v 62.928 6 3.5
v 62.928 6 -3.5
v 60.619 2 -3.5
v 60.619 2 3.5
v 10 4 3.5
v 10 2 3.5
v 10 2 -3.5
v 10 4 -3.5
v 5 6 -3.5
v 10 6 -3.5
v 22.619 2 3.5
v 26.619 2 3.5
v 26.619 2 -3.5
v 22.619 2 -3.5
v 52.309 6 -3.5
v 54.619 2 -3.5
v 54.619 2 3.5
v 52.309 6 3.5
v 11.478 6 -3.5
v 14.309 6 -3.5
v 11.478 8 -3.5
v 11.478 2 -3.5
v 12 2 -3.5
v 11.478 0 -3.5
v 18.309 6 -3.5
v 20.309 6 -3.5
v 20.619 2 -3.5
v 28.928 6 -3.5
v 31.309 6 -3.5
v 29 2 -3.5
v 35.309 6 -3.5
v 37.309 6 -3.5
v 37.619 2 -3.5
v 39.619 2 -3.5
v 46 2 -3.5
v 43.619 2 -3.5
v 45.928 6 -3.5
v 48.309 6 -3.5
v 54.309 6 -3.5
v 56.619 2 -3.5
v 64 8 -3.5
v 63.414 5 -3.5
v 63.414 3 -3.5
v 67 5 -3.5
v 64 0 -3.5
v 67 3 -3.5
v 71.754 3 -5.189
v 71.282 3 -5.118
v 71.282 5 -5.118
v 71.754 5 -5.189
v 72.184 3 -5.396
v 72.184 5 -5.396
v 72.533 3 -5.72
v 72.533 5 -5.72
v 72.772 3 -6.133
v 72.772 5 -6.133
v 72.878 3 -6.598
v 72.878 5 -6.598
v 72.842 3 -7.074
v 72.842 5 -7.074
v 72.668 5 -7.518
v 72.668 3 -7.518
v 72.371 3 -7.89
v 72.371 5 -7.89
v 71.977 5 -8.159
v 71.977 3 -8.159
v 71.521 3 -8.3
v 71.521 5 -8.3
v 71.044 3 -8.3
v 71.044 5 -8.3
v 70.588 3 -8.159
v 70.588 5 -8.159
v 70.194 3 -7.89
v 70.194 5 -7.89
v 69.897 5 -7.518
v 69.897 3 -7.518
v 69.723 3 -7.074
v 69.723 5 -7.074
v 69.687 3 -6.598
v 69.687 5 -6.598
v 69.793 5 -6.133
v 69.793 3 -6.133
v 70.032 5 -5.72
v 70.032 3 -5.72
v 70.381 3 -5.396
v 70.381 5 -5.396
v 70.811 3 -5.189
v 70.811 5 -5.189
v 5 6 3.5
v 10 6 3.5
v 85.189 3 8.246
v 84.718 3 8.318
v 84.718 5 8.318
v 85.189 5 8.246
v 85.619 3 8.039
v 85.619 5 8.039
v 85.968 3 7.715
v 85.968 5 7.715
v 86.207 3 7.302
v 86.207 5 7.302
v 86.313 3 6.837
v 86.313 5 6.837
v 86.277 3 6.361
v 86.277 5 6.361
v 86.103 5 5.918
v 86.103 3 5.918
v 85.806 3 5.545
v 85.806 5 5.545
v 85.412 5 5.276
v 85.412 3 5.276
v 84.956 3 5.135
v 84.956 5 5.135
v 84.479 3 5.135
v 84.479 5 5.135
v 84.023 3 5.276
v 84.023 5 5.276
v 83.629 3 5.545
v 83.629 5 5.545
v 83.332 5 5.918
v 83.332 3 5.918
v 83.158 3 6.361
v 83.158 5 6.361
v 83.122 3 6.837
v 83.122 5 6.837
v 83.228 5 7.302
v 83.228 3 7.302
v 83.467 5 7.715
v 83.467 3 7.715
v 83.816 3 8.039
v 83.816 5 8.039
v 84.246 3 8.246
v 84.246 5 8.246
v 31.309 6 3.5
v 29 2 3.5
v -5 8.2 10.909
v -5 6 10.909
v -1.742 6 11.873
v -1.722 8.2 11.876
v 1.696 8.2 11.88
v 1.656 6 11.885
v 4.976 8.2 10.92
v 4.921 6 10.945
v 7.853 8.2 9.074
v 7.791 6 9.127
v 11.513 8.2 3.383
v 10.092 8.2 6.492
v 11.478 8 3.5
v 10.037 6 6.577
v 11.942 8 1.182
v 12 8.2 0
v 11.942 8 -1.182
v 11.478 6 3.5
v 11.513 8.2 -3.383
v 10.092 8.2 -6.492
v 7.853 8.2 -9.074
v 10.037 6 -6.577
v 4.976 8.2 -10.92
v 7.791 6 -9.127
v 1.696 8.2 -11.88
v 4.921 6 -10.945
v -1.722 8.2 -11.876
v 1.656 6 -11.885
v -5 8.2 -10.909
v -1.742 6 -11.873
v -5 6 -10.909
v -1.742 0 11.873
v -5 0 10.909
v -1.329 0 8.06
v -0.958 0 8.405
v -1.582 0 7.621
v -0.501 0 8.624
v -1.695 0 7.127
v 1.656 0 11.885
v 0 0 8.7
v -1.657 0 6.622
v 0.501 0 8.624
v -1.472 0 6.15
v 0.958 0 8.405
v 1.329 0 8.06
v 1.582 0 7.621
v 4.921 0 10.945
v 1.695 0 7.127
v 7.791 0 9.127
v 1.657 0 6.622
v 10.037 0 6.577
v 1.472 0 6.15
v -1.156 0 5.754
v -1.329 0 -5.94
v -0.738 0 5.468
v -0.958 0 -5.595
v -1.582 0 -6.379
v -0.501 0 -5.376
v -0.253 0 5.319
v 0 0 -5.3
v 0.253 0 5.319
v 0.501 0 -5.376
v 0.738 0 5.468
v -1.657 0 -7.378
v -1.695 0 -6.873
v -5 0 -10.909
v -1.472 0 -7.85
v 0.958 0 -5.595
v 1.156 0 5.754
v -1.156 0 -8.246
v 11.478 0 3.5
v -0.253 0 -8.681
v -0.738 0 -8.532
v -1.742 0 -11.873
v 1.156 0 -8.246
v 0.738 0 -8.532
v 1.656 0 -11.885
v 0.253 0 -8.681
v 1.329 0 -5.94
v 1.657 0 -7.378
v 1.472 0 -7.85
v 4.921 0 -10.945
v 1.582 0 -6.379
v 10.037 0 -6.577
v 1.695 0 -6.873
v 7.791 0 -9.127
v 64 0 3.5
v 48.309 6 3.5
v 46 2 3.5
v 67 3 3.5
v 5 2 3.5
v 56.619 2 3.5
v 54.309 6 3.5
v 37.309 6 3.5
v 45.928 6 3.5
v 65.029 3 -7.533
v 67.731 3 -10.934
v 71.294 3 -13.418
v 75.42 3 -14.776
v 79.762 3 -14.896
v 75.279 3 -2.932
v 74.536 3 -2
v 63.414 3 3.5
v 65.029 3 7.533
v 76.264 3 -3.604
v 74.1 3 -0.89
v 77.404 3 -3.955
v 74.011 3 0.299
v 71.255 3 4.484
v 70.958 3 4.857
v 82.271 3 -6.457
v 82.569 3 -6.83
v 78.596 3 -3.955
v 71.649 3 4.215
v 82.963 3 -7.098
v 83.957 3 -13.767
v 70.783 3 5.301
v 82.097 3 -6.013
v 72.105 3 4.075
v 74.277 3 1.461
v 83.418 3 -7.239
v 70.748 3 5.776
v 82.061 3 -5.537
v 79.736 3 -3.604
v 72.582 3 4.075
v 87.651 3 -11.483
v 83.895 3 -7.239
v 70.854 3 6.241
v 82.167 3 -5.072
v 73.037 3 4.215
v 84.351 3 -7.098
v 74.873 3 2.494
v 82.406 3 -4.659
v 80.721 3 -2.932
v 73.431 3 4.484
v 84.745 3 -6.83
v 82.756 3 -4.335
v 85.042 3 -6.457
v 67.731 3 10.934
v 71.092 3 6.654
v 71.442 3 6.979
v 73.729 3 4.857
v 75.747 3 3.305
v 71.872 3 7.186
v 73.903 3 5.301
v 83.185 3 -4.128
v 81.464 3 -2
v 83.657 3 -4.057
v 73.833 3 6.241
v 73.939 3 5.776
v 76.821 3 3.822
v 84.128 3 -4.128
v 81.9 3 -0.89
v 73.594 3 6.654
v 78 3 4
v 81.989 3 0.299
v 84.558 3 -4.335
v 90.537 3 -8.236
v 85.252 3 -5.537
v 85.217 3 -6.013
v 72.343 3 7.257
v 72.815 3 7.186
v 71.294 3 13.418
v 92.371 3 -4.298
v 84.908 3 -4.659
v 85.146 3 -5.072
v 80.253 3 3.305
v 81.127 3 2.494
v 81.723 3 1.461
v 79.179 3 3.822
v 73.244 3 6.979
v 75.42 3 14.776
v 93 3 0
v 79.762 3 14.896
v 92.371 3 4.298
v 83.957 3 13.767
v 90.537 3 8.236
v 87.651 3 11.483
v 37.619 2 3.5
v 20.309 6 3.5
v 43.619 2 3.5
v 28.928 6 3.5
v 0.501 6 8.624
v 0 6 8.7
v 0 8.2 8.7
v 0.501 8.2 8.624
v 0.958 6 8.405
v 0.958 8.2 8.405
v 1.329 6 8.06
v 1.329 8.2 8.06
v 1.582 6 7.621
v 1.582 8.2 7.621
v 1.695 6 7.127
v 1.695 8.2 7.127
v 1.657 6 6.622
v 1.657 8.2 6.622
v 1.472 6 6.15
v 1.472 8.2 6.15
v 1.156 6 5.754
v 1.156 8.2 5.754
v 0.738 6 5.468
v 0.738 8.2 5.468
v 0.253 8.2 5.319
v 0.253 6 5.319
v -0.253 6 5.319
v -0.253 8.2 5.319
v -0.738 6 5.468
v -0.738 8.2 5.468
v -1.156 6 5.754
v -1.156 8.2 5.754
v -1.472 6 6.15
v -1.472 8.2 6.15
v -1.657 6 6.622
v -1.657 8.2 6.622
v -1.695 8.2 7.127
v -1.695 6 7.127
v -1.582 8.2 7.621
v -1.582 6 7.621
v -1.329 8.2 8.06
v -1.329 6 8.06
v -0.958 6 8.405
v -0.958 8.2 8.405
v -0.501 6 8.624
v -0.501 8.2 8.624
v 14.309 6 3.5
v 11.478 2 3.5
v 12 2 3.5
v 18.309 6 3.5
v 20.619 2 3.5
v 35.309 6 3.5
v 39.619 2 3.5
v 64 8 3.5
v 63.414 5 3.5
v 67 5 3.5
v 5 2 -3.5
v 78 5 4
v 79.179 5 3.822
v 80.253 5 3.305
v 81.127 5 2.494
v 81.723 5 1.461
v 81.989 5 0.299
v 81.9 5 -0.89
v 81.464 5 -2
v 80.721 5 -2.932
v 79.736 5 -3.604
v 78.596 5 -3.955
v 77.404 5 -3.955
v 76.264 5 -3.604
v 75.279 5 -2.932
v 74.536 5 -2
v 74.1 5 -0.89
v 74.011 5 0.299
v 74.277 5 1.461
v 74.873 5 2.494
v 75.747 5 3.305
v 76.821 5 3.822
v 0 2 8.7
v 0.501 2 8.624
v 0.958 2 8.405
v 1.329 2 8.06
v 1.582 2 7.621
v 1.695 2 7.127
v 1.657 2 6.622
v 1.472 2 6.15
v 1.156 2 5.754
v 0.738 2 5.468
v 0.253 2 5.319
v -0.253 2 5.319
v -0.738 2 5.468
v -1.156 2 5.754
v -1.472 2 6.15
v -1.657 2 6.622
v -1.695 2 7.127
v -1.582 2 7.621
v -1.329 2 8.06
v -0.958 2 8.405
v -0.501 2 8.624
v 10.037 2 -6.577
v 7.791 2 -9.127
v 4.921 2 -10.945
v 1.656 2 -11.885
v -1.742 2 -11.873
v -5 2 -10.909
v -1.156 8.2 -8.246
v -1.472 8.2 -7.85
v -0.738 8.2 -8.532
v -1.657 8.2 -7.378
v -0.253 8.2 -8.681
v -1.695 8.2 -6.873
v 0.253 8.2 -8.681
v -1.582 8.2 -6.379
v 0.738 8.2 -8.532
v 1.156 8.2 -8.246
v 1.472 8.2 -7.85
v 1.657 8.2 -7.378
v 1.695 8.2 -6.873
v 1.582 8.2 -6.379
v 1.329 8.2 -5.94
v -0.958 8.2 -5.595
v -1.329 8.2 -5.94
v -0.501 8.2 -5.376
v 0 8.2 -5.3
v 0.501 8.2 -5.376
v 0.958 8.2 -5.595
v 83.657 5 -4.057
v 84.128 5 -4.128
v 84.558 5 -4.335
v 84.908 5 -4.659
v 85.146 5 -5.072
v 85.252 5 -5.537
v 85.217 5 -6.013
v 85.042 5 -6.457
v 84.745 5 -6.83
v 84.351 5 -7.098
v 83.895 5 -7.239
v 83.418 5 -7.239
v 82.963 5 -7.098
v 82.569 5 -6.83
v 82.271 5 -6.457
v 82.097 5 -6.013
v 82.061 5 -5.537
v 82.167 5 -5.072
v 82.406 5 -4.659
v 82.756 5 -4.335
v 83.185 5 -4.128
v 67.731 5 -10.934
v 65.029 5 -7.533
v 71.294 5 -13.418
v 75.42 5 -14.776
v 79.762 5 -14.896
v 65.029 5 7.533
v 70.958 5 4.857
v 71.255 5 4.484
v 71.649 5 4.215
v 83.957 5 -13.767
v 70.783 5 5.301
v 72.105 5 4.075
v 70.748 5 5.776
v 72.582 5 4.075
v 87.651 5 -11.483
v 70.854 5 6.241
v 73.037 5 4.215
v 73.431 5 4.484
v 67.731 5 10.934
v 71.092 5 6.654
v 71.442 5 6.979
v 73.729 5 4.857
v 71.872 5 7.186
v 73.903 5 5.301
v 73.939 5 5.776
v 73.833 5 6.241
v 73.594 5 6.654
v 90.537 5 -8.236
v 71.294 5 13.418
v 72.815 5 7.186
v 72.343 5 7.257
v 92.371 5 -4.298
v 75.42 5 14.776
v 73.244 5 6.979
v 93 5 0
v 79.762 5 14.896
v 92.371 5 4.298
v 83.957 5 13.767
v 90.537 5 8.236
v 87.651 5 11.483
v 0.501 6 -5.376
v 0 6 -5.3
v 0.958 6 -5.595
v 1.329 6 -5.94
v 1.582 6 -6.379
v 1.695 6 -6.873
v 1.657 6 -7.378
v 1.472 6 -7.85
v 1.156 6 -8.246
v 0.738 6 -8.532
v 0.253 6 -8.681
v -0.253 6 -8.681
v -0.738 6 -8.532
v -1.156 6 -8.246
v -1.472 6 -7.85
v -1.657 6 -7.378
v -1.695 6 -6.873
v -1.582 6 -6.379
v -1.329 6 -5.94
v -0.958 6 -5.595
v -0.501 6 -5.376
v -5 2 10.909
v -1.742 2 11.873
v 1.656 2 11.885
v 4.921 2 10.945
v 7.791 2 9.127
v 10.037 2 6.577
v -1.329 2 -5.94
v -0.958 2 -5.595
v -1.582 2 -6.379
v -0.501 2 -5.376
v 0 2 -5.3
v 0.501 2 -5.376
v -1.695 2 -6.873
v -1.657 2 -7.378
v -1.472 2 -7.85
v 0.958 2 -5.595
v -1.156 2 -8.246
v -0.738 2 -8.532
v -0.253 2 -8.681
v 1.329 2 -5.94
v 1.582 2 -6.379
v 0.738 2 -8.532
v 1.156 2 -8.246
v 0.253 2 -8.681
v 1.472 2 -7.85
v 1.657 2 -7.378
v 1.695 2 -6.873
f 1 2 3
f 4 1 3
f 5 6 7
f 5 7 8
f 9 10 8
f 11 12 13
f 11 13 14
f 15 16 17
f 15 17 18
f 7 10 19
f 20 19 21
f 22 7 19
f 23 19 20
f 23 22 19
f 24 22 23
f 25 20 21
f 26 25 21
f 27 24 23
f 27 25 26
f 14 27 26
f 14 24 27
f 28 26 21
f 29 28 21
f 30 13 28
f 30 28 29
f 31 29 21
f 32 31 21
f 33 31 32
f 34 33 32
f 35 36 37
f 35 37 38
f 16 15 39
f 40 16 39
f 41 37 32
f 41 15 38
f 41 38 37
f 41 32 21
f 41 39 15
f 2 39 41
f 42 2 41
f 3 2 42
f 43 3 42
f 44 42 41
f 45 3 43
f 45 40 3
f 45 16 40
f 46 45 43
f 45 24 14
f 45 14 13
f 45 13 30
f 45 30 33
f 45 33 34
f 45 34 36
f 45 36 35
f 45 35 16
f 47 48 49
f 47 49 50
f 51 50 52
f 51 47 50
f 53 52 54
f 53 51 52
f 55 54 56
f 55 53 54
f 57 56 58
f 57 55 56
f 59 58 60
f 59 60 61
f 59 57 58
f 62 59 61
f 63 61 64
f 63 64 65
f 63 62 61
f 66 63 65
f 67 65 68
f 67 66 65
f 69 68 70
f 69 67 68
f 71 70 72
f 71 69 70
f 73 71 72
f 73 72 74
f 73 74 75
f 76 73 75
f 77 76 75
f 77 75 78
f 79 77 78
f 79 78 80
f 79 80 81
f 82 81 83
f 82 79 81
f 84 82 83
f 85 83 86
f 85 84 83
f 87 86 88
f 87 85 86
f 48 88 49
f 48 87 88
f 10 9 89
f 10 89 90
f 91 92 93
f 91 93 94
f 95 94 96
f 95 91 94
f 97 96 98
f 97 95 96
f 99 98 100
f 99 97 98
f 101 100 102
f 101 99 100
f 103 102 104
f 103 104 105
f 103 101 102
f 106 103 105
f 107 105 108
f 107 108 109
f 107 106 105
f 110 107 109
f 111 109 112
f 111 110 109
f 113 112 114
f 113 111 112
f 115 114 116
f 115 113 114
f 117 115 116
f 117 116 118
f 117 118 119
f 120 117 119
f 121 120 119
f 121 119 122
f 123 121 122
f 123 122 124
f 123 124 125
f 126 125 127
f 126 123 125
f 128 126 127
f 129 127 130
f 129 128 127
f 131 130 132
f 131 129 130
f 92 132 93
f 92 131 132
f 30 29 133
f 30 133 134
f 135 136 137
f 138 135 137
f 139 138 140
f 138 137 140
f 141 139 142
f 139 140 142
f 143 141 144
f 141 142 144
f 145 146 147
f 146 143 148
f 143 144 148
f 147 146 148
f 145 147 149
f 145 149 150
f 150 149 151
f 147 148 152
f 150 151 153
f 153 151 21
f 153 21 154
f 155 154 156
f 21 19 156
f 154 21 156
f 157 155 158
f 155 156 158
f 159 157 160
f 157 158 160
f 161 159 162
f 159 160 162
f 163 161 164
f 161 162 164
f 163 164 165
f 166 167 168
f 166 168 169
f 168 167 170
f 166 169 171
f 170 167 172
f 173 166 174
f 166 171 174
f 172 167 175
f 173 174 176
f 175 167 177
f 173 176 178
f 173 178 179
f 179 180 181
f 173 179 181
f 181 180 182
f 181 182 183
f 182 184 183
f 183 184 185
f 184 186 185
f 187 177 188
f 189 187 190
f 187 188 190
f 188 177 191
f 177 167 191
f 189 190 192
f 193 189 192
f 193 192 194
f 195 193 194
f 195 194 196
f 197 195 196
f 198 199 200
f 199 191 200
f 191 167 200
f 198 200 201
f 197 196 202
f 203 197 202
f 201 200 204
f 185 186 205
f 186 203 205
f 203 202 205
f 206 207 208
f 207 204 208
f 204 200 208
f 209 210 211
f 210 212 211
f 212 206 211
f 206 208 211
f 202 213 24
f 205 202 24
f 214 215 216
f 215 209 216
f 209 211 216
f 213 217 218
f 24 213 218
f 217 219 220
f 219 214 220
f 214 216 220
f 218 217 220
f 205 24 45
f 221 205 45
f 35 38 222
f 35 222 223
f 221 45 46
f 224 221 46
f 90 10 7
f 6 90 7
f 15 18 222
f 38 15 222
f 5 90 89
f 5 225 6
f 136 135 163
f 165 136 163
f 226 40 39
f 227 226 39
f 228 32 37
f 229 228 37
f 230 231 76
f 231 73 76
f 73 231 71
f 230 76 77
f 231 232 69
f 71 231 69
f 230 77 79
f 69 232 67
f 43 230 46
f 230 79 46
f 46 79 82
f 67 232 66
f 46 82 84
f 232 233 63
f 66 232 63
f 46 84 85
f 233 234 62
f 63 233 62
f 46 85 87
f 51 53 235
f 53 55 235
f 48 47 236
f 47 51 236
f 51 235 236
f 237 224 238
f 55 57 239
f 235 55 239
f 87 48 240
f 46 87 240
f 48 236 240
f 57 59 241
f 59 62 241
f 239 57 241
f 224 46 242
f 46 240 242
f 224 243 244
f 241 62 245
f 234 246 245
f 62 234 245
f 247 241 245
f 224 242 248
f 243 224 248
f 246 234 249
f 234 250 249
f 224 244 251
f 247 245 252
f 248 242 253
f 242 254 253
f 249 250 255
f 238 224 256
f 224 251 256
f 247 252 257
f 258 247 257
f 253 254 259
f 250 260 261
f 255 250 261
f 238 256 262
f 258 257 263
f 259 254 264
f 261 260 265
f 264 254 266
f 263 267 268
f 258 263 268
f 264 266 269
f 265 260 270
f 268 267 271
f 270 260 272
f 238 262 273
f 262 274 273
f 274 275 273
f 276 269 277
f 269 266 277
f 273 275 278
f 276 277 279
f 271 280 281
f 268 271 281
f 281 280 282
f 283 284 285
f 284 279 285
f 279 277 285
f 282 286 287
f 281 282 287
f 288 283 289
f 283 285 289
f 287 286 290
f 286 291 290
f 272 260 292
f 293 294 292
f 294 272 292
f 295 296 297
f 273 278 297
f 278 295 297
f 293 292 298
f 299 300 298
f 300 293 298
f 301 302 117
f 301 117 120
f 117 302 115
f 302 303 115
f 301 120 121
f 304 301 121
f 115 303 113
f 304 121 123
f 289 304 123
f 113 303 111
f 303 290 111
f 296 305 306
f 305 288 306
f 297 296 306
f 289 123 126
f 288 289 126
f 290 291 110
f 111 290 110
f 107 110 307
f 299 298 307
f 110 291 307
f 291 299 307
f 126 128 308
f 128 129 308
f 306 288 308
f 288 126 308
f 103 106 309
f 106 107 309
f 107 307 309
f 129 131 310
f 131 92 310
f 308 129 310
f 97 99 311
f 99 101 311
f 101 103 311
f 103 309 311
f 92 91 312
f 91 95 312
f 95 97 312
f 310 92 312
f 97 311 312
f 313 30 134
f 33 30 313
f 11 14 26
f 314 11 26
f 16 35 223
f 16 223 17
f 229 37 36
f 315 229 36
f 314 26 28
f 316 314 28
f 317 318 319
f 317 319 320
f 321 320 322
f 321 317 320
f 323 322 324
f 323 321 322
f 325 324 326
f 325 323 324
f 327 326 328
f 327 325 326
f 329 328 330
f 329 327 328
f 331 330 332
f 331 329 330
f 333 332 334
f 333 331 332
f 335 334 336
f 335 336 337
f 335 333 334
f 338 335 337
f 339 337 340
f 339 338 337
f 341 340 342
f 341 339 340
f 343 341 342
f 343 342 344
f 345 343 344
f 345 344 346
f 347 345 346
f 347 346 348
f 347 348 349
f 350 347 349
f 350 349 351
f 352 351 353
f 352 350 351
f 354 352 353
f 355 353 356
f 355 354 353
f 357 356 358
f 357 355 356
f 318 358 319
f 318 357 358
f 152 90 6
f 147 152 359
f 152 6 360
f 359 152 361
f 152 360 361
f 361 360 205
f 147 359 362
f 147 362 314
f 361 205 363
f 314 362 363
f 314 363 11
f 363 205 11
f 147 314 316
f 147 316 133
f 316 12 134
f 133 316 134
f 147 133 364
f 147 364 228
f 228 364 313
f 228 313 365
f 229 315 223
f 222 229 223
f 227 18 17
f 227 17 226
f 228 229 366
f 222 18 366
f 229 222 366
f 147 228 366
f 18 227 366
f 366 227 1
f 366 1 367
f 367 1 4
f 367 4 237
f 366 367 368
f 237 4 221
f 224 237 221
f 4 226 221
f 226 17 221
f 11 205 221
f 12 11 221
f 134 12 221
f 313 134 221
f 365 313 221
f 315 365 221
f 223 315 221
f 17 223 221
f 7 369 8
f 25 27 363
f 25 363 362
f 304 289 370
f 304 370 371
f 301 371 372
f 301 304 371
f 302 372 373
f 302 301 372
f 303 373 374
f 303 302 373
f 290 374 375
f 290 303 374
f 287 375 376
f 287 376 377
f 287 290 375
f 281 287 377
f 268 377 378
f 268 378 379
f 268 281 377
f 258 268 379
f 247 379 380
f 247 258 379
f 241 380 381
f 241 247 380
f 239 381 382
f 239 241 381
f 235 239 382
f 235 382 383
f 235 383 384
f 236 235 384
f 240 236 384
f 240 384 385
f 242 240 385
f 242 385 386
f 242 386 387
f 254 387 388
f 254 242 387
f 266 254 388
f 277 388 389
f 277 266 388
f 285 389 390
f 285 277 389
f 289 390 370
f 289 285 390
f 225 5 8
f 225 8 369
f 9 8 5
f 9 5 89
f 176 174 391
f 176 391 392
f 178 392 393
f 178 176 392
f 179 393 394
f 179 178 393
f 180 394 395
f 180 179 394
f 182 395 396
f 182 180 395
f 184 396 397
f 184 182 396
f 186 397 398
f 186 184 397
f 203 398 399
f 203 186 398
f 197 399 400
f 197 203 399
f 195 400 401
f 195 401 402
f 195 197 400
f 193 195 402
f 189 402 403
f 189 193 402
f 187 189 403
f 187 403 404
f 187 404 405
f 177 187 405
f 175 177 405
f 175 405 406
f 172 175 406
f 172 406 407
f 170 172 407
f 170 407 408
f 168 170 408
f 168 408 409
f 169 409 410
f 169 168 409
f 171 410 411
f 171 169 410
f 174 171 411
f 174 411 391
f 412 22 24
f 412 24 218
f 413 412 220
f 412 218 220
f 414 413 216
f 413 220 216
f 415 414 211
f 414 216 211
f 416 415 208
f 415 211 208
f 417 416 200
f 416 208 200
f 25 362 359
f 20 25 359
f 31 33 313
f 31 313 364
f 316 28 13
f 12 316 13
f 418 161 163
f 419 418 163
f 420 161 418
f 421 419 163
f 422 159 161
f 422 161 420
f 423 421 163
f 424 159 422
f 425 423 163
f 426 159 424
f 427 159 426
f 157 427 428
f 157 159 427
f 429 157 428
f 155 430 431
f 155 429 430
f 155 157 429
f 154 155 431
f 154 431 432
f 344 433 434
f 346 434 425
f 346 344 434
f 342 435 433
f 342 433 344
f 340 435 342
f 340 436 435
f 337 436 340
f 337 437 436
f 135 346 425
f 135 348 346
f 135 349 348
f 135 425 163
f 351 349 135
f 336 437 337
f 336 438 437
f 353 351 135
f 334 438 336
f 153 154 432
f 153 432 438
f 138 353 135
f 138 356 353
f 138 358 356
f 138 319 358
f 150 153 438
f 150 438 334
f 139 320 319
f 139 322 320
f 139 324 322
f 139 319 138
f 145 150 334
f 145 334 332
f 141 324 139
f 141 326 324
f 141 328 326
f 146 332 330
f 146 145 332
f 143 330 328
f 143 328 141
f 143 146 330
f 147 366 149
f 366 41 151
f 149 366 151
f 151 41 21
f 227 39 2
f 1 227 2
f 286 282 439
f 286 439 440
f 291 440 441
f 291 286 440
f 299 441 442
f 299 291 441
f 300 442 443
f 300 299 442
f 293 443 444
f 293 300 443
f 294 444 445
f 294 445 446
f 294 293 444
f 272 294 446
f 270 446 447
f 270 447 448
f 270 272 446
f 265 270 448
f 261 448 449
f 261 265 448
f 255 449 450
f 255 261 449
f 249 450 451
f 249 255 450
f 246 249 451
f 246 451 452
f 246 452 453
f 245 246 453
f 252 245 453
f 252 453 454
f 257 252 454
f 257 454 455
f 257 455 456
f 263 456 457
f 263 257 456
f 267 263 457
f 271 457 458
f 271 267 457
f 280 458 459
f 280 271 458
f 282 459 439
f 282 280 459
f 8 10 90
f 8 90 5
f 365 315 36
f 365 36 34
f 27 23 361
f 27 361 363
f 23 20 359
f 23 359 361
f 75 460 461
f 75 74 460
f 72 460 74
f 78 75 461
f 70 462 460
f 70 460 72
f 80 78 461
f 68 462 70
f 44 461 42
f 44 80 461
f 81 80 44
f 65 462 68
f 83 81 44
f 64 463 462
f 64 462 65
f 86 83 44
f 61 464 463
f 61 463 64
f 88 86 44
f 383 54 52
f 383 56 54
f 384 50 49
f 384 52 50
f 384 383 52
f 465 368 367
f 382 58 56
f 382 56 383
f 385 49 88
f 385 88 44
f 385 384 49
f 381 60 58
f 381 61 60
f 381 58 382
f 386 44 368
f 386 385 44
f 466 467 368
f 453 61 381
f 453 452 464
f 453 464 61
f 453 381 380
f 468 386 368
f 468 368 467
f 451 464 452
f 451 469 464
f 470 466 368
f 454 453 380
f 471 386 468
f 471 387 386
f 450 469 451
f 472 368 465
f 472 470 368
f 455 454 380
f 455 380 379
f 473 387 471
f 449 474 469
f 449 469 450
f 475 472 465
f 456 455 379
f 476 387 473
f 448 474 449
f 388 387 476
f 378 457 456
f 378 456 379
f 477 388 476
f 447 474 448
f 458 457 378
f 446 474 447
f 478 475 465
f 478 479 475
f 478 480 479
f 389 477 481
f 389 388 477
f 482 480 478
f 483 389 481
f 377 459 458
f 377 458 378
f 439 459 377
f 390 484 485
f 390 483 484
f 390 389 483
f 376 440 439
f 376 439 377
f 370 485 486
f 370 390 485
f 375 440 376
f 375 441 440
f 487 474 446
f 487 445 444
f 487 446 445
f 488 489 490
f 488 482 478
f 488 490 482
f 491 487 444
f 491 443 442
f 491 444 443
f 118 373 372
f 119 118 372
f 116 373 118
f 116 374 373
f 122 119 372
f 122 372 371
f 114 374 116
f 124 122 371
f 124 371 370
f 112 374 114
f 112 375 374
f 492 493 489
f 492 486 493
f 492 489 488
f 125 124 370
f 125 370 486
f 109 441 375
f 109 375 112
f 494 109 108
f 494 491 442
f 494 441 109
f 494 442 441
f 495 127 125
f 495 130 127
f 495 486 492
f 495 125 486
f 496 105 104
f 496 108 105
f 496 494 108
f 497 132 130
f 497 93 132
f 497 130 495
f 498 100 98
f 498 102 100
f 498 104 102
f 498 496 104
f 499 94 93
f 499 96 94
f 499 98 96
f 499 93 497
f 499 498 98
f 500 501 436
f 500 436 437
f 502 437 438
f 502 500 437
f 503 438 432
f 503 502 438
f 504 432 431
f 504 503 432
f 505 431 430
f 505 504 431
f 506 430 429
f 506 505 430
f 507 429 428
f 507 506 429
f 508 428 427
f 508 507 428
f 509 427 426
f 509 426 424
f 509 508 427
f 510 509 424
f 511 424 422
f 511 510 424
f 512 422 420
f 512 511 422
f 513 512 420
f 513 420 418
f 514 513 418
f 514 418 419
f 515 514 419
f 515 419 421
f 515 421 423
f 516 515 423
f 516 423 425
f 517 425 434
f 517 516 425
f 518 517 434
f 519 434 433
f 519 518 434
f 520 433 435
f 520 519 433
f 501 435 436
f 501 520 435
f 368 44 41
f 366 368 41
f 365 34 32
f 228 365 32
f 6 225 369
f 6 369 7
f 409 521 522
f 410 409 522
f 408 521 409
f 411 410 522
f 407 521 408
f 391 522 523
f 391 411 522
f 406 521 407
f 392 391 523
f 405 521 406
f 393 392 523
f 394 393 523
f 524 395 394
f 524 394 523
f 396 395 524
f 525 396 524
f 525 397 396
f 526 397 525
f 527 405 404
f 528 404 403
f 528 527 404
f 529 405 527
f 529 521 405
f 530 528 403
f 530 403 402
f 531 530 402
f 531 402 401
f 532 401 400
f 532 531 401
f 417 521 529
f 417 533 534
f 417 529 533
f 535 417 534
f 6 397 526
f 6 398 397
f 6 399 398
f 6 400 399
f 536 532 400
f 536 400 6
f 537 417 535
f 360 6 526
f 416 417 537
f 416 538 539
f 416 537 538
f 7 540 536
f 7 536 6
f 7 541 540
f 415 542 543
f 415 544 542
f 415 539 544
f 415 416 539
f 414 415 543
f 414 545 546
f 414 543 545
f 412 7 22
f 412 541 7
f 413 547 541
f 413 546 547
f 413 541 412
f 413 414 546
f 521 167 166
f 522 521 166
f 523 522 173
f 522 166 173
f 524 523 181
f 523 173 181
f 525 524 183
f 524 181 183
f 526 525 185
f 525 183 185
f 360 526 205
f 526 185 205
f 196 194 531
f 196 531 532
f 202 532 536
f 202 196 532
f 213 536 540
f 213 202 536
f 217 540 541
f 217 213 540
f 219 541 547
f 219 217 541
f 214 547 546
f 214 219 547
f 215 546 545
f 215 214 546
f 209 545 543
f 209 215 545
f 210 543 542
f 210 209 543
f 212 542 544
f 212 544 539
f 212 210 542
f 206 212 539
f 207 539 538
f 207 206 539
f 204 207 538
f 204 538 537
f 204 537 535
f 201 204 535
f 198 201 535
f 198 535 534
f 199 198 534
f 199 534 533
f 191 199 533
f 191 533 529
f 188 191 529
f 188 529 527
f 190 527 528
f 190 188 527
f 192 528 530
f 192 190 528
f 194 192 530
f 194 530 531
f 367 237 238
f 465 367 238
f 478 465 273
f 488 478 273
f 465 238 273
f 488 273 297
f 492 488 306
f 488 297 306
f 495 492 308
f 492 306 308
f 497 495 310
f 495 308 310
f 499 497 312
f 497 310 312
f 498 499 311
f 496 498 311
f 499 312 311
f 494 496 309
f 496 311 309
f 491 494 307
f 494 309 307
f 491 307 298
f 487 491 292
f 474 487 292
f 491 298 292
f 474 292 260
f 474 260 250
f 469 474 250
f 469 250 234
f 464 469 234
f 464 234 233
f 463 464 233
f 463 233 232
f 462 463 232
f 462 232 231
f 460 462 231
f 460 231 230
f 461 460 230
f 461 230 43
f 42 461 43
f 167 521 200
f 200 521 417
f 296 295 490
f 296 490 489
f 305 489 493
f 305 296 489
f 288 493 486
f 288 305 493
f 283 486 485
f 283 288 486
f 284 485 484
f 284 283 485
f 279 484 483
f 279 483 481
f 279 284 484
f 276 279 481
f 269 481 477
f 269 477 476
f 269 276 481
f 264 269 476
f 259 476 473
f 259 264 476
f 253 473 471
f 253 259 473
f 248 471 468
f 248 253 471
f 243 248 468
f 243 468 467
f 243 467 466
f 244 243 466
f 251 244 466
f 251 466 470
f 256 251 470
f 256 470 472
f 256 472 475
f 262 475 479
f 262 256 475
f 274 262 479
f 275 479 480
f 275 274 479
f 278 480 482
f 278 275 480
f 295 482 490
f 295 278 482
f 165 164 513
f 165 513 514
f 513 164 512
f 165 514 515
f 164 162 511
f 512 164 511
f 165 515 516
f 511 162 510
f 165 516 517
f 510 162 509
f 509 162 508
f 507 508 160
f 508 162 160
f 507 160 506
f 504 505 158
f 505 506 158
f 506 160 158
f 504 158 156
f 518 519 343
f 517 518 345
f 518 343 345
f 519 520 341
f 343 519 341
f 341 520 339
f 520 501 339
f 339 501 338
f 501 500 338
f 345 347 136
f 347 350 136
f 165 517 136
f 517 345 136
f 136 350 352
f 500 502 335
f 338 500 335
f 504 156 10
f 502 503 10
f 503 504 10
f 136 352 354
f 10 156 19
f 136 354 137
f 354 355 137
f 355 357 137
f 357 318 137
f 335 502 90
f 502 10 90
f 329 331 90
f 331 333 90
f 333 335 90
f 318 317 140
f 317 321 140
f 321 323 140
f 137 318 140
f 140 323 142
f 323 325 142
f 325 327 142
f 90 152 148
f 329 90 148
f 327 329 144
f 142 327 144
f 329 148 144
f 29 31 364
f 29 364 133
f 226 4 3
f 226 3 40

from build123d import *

# Parameters (mm, degrees)
SKETCH_1_W               = 54.25
SKETCH_1_H               = 7
EXTRUDE_1_DEPTH          = 2
SKETCH_2_R               = 12
SKETCH_2_R_2             = 1.7
EXTRUDE_2_DEPTH          = 2
EXTRUDE_START            = 6
SKETCH_3_R               = 12
SKETCH_3_R_2             = 1.7
EXTRUDE_3_DEPTH          = 2.2
EXTRUDE_5_DEPTH          = 1
EXTRUDE_5_DEPTH_BACK     = 1
SKETCH_5_R               = 15
SKETCH_5_R_2             = 1.6
SKETCH_5_R_3             = 4
EXTRUDE_START_2          = -3.5
EXTRUDE_6_DEPTH          = 7
GUSSET_1_THICKNESS       = 7
GUSSET_2_THICKNESS       = 7
CUT_EXTRUDE_1_DEPTH      = 10
CUT_EXTRUDE_1_DEPTH_BACK = 10
SKETCH_9_W               = 10
SKETCH_9_H               = 24.43853107


with BuildPart() as part:
    # 草图1 → 凸台-拉伸1 (new body)
    with BuildSketch(Plane(origin=(0, 0, 0), x_dir=(1, 0, 0), z_dir=(0, 1, 0))):
        with Locations((27.125, 0)):
            Rectangle(SKETCH_1_W, SKETCH_1_H)
    extrude(amount=EXTRUDE_1_DEPTH)

    # 草图2 → 凸台-拉伸2 (add)
    with BuildSketch(Plane(origin=(0, 0, 0), x_dir=(1, 0, 0), z_dir=(0, 1, 0))):
        Circle(SKETCH_2_R)
        with Locations(Location((0, -7, 0), (0, 0, 270))):
            Circle(SKETCH_2_R_2, mode=Mode.SUBTRACT)
        with Locations(Location((0, 7, 0), (0, 0, 270))):
            Circle(SKETCH_2_R_2, mode=Mode.SUBTRACT)
    extrude(amount=EXTRUDE_2_DEPTH)



with BuildPart() as body_2:
    # 草图3 → 凸台-拉伸3 (new body)
    with BuildSketch(Plane(origin=(0, 0, 0), x_dir=(1, 0, 0), z_dir=(0, 1, 0)).offset(EXTRUDE_START)):
        with Locations(Location((0, 0, 0), (0, 0, 270))):
            Circle(SKETCH_3_R)
        with Locations(Location((0, -7, 0), (0, 0, 270))):
            Circle(SKETCH_3_R_2, mode=Mode.SUBTRACT)
        with Locations(Location((0, 7, 0), (0, 0, 270))):
            Circle(SKETCH_3_R_2, mode=Mode.SUBTRACT)
    extrude(amount=EXTRUDE_3_DEPTH)


with BuildPart() as body_3:
    # 草图5 → 凸台-拉伸5 (new, two sides: drawn at the far end of the back side and taken through both)
    with BuildSketch(Plane(origin=(0, 4, 0), x_dir=(1, 0, 0), z_dir=(0, 1, 0)).offset(-EXTRUDE_5_DEPTH_BACK)):
        with Locations(Location((78, 0, 0), (0, 0, 270))):
            Circle(SKETCH_5_R)
        with Locations(Location((72.343145751, -5.656854249, 0), (0, 0, 270))):
            Circle(SKETCH_5_R_2, mode=Mode.SUBTRACT)
        with Locations(Location((71.282485579, 6.717514421, 0), (0, 0, 270))):
            Circle(SKETCH_5_R_2, mode=Mode.SUBTRACT)
        with Locations(Location((84.717514421, -6.717514421, 0), (0, 0, 270))):
            Circle(SKETCH_5_R_2, mode=Mode.SUBTRACT)
        with Locations(Location((83.656854249, 5.656854249, 0), (0, 0, 270))):
            Circle(SKETCH_5_R_2, mode=Mode.SUBTRACT)
        with Locations(Location((78, 0, 0), (0, 0, 270))):
            Circle(SKETCH_5_R_3, mode=Mode.SUBTRACT)
    extrude(amount=EXTRUDE_5_DEPTH + EXTRUDE_5_DEPTH_BACK)


with BuildPart() as part_1:
    add(part.part)

    add(body_2.part)  # 凸台-拉伸6 merges body 2

    add(body_3.part)  # 凸台-拉伸6 merges body 3
    # 草图6 → 凸台-拉伸6 (add)
    with BuildSketch(Plane.XY.offset(EXTRUDE_START_2)):
        Polygon((10, 0), (64, 0), (67, 3), (67, 5), (64, 8), (10, 8), align=None)
        Polygon((31.309401077, 6), (29, 2), (37.618802154, 2), (35.309401077, 6), align=None, mode=Mode.SUBTRACT)
        Polygon((12, 2), (20.618802154, 2), (18.309401077, 6), (14.309401077, 6), align=None, mode=Mode.SUBTRACT)
        Polygon((20.309401077, 6), (28.92820323, 6), (26.618802154, 2), (22.618802154, 2), align=None, mode=Mode.SUBTRACT)
        Polygon((39.618802154, 2), (37.309401077, 6), (45.92820323, 6), (43.618802154, 2), align=None, mode=Mode.SUBTRACT)
        Polygon((48.309401077, 6), (46, 2), (54.618802154, 2), (52.309401077, 6), align=None, mode=Mode.SUBTRACT)
        Polygon((56.618802154, 2), (54.309401077, 6), (62.92820323, 6), (60.618802154, 2), align=None, mode=Mode.SUBTRACT)
    extrude(amount=EXTRUDE_6_DEPTH)

    # 草图9 → 切除-拉伸1 (cut, two sides: drawn at the far end of the back side and taken through both)
    with BuildSketch(Plane(origin=(0, 4, 0), x_dir=(-1, 0, 0), z_dir=(0, -1, 0)).offset(-CUT_EXTRUDE_1_DEPTH_BACK)):
        with Locations((10, 0)):
            Rectangle(SKETCH_9_W, SKETCH_9_H)
    extrude(amount=CUT_EXTRUDE_1_DEPTH + CUT_EXTRUDE_1_DEPTH_BACK, mode=Mode.SUBTRACT)


with BuildPart() as body_2_2:
    # Gusset 1: a gusset: a plate 7.0 thick in the corner of two members, its outline drawn in place
    gusset_1_outline = Wire([Line((10, 6, -3.5), (10, 4, -3.5)), Line((10, 4, -3.5), (5, 6, -3.5)), Line((5, 6, -3.5), (10, 6, -3.5))])
    add(extrude(Face(gusset_1_outline), amount=GUSSET_1_THICKNESS, dir=(0, 0, 1)))


with BuildPart() as body_3_2:
    # Gusset 2: a gusset: a plate 7.0 thick in the corner of two members, its outline drawn in place
    gusset_2_outline = Wire([Line((10, 2, 3.5), (10, 4, 3.5)), Line((10, 4, 3.5), (5, 2, 3.5)), Line((5, 2, 3.5), (10, 2, 3.5))])
    add(extrude(Face(gusset_2_outline), amount=GUSSET_2_THICKNESS, dir=(0, 0, -1)))


solid = Compound([part_1.part, body_2_2.part, body_3_2.part])
